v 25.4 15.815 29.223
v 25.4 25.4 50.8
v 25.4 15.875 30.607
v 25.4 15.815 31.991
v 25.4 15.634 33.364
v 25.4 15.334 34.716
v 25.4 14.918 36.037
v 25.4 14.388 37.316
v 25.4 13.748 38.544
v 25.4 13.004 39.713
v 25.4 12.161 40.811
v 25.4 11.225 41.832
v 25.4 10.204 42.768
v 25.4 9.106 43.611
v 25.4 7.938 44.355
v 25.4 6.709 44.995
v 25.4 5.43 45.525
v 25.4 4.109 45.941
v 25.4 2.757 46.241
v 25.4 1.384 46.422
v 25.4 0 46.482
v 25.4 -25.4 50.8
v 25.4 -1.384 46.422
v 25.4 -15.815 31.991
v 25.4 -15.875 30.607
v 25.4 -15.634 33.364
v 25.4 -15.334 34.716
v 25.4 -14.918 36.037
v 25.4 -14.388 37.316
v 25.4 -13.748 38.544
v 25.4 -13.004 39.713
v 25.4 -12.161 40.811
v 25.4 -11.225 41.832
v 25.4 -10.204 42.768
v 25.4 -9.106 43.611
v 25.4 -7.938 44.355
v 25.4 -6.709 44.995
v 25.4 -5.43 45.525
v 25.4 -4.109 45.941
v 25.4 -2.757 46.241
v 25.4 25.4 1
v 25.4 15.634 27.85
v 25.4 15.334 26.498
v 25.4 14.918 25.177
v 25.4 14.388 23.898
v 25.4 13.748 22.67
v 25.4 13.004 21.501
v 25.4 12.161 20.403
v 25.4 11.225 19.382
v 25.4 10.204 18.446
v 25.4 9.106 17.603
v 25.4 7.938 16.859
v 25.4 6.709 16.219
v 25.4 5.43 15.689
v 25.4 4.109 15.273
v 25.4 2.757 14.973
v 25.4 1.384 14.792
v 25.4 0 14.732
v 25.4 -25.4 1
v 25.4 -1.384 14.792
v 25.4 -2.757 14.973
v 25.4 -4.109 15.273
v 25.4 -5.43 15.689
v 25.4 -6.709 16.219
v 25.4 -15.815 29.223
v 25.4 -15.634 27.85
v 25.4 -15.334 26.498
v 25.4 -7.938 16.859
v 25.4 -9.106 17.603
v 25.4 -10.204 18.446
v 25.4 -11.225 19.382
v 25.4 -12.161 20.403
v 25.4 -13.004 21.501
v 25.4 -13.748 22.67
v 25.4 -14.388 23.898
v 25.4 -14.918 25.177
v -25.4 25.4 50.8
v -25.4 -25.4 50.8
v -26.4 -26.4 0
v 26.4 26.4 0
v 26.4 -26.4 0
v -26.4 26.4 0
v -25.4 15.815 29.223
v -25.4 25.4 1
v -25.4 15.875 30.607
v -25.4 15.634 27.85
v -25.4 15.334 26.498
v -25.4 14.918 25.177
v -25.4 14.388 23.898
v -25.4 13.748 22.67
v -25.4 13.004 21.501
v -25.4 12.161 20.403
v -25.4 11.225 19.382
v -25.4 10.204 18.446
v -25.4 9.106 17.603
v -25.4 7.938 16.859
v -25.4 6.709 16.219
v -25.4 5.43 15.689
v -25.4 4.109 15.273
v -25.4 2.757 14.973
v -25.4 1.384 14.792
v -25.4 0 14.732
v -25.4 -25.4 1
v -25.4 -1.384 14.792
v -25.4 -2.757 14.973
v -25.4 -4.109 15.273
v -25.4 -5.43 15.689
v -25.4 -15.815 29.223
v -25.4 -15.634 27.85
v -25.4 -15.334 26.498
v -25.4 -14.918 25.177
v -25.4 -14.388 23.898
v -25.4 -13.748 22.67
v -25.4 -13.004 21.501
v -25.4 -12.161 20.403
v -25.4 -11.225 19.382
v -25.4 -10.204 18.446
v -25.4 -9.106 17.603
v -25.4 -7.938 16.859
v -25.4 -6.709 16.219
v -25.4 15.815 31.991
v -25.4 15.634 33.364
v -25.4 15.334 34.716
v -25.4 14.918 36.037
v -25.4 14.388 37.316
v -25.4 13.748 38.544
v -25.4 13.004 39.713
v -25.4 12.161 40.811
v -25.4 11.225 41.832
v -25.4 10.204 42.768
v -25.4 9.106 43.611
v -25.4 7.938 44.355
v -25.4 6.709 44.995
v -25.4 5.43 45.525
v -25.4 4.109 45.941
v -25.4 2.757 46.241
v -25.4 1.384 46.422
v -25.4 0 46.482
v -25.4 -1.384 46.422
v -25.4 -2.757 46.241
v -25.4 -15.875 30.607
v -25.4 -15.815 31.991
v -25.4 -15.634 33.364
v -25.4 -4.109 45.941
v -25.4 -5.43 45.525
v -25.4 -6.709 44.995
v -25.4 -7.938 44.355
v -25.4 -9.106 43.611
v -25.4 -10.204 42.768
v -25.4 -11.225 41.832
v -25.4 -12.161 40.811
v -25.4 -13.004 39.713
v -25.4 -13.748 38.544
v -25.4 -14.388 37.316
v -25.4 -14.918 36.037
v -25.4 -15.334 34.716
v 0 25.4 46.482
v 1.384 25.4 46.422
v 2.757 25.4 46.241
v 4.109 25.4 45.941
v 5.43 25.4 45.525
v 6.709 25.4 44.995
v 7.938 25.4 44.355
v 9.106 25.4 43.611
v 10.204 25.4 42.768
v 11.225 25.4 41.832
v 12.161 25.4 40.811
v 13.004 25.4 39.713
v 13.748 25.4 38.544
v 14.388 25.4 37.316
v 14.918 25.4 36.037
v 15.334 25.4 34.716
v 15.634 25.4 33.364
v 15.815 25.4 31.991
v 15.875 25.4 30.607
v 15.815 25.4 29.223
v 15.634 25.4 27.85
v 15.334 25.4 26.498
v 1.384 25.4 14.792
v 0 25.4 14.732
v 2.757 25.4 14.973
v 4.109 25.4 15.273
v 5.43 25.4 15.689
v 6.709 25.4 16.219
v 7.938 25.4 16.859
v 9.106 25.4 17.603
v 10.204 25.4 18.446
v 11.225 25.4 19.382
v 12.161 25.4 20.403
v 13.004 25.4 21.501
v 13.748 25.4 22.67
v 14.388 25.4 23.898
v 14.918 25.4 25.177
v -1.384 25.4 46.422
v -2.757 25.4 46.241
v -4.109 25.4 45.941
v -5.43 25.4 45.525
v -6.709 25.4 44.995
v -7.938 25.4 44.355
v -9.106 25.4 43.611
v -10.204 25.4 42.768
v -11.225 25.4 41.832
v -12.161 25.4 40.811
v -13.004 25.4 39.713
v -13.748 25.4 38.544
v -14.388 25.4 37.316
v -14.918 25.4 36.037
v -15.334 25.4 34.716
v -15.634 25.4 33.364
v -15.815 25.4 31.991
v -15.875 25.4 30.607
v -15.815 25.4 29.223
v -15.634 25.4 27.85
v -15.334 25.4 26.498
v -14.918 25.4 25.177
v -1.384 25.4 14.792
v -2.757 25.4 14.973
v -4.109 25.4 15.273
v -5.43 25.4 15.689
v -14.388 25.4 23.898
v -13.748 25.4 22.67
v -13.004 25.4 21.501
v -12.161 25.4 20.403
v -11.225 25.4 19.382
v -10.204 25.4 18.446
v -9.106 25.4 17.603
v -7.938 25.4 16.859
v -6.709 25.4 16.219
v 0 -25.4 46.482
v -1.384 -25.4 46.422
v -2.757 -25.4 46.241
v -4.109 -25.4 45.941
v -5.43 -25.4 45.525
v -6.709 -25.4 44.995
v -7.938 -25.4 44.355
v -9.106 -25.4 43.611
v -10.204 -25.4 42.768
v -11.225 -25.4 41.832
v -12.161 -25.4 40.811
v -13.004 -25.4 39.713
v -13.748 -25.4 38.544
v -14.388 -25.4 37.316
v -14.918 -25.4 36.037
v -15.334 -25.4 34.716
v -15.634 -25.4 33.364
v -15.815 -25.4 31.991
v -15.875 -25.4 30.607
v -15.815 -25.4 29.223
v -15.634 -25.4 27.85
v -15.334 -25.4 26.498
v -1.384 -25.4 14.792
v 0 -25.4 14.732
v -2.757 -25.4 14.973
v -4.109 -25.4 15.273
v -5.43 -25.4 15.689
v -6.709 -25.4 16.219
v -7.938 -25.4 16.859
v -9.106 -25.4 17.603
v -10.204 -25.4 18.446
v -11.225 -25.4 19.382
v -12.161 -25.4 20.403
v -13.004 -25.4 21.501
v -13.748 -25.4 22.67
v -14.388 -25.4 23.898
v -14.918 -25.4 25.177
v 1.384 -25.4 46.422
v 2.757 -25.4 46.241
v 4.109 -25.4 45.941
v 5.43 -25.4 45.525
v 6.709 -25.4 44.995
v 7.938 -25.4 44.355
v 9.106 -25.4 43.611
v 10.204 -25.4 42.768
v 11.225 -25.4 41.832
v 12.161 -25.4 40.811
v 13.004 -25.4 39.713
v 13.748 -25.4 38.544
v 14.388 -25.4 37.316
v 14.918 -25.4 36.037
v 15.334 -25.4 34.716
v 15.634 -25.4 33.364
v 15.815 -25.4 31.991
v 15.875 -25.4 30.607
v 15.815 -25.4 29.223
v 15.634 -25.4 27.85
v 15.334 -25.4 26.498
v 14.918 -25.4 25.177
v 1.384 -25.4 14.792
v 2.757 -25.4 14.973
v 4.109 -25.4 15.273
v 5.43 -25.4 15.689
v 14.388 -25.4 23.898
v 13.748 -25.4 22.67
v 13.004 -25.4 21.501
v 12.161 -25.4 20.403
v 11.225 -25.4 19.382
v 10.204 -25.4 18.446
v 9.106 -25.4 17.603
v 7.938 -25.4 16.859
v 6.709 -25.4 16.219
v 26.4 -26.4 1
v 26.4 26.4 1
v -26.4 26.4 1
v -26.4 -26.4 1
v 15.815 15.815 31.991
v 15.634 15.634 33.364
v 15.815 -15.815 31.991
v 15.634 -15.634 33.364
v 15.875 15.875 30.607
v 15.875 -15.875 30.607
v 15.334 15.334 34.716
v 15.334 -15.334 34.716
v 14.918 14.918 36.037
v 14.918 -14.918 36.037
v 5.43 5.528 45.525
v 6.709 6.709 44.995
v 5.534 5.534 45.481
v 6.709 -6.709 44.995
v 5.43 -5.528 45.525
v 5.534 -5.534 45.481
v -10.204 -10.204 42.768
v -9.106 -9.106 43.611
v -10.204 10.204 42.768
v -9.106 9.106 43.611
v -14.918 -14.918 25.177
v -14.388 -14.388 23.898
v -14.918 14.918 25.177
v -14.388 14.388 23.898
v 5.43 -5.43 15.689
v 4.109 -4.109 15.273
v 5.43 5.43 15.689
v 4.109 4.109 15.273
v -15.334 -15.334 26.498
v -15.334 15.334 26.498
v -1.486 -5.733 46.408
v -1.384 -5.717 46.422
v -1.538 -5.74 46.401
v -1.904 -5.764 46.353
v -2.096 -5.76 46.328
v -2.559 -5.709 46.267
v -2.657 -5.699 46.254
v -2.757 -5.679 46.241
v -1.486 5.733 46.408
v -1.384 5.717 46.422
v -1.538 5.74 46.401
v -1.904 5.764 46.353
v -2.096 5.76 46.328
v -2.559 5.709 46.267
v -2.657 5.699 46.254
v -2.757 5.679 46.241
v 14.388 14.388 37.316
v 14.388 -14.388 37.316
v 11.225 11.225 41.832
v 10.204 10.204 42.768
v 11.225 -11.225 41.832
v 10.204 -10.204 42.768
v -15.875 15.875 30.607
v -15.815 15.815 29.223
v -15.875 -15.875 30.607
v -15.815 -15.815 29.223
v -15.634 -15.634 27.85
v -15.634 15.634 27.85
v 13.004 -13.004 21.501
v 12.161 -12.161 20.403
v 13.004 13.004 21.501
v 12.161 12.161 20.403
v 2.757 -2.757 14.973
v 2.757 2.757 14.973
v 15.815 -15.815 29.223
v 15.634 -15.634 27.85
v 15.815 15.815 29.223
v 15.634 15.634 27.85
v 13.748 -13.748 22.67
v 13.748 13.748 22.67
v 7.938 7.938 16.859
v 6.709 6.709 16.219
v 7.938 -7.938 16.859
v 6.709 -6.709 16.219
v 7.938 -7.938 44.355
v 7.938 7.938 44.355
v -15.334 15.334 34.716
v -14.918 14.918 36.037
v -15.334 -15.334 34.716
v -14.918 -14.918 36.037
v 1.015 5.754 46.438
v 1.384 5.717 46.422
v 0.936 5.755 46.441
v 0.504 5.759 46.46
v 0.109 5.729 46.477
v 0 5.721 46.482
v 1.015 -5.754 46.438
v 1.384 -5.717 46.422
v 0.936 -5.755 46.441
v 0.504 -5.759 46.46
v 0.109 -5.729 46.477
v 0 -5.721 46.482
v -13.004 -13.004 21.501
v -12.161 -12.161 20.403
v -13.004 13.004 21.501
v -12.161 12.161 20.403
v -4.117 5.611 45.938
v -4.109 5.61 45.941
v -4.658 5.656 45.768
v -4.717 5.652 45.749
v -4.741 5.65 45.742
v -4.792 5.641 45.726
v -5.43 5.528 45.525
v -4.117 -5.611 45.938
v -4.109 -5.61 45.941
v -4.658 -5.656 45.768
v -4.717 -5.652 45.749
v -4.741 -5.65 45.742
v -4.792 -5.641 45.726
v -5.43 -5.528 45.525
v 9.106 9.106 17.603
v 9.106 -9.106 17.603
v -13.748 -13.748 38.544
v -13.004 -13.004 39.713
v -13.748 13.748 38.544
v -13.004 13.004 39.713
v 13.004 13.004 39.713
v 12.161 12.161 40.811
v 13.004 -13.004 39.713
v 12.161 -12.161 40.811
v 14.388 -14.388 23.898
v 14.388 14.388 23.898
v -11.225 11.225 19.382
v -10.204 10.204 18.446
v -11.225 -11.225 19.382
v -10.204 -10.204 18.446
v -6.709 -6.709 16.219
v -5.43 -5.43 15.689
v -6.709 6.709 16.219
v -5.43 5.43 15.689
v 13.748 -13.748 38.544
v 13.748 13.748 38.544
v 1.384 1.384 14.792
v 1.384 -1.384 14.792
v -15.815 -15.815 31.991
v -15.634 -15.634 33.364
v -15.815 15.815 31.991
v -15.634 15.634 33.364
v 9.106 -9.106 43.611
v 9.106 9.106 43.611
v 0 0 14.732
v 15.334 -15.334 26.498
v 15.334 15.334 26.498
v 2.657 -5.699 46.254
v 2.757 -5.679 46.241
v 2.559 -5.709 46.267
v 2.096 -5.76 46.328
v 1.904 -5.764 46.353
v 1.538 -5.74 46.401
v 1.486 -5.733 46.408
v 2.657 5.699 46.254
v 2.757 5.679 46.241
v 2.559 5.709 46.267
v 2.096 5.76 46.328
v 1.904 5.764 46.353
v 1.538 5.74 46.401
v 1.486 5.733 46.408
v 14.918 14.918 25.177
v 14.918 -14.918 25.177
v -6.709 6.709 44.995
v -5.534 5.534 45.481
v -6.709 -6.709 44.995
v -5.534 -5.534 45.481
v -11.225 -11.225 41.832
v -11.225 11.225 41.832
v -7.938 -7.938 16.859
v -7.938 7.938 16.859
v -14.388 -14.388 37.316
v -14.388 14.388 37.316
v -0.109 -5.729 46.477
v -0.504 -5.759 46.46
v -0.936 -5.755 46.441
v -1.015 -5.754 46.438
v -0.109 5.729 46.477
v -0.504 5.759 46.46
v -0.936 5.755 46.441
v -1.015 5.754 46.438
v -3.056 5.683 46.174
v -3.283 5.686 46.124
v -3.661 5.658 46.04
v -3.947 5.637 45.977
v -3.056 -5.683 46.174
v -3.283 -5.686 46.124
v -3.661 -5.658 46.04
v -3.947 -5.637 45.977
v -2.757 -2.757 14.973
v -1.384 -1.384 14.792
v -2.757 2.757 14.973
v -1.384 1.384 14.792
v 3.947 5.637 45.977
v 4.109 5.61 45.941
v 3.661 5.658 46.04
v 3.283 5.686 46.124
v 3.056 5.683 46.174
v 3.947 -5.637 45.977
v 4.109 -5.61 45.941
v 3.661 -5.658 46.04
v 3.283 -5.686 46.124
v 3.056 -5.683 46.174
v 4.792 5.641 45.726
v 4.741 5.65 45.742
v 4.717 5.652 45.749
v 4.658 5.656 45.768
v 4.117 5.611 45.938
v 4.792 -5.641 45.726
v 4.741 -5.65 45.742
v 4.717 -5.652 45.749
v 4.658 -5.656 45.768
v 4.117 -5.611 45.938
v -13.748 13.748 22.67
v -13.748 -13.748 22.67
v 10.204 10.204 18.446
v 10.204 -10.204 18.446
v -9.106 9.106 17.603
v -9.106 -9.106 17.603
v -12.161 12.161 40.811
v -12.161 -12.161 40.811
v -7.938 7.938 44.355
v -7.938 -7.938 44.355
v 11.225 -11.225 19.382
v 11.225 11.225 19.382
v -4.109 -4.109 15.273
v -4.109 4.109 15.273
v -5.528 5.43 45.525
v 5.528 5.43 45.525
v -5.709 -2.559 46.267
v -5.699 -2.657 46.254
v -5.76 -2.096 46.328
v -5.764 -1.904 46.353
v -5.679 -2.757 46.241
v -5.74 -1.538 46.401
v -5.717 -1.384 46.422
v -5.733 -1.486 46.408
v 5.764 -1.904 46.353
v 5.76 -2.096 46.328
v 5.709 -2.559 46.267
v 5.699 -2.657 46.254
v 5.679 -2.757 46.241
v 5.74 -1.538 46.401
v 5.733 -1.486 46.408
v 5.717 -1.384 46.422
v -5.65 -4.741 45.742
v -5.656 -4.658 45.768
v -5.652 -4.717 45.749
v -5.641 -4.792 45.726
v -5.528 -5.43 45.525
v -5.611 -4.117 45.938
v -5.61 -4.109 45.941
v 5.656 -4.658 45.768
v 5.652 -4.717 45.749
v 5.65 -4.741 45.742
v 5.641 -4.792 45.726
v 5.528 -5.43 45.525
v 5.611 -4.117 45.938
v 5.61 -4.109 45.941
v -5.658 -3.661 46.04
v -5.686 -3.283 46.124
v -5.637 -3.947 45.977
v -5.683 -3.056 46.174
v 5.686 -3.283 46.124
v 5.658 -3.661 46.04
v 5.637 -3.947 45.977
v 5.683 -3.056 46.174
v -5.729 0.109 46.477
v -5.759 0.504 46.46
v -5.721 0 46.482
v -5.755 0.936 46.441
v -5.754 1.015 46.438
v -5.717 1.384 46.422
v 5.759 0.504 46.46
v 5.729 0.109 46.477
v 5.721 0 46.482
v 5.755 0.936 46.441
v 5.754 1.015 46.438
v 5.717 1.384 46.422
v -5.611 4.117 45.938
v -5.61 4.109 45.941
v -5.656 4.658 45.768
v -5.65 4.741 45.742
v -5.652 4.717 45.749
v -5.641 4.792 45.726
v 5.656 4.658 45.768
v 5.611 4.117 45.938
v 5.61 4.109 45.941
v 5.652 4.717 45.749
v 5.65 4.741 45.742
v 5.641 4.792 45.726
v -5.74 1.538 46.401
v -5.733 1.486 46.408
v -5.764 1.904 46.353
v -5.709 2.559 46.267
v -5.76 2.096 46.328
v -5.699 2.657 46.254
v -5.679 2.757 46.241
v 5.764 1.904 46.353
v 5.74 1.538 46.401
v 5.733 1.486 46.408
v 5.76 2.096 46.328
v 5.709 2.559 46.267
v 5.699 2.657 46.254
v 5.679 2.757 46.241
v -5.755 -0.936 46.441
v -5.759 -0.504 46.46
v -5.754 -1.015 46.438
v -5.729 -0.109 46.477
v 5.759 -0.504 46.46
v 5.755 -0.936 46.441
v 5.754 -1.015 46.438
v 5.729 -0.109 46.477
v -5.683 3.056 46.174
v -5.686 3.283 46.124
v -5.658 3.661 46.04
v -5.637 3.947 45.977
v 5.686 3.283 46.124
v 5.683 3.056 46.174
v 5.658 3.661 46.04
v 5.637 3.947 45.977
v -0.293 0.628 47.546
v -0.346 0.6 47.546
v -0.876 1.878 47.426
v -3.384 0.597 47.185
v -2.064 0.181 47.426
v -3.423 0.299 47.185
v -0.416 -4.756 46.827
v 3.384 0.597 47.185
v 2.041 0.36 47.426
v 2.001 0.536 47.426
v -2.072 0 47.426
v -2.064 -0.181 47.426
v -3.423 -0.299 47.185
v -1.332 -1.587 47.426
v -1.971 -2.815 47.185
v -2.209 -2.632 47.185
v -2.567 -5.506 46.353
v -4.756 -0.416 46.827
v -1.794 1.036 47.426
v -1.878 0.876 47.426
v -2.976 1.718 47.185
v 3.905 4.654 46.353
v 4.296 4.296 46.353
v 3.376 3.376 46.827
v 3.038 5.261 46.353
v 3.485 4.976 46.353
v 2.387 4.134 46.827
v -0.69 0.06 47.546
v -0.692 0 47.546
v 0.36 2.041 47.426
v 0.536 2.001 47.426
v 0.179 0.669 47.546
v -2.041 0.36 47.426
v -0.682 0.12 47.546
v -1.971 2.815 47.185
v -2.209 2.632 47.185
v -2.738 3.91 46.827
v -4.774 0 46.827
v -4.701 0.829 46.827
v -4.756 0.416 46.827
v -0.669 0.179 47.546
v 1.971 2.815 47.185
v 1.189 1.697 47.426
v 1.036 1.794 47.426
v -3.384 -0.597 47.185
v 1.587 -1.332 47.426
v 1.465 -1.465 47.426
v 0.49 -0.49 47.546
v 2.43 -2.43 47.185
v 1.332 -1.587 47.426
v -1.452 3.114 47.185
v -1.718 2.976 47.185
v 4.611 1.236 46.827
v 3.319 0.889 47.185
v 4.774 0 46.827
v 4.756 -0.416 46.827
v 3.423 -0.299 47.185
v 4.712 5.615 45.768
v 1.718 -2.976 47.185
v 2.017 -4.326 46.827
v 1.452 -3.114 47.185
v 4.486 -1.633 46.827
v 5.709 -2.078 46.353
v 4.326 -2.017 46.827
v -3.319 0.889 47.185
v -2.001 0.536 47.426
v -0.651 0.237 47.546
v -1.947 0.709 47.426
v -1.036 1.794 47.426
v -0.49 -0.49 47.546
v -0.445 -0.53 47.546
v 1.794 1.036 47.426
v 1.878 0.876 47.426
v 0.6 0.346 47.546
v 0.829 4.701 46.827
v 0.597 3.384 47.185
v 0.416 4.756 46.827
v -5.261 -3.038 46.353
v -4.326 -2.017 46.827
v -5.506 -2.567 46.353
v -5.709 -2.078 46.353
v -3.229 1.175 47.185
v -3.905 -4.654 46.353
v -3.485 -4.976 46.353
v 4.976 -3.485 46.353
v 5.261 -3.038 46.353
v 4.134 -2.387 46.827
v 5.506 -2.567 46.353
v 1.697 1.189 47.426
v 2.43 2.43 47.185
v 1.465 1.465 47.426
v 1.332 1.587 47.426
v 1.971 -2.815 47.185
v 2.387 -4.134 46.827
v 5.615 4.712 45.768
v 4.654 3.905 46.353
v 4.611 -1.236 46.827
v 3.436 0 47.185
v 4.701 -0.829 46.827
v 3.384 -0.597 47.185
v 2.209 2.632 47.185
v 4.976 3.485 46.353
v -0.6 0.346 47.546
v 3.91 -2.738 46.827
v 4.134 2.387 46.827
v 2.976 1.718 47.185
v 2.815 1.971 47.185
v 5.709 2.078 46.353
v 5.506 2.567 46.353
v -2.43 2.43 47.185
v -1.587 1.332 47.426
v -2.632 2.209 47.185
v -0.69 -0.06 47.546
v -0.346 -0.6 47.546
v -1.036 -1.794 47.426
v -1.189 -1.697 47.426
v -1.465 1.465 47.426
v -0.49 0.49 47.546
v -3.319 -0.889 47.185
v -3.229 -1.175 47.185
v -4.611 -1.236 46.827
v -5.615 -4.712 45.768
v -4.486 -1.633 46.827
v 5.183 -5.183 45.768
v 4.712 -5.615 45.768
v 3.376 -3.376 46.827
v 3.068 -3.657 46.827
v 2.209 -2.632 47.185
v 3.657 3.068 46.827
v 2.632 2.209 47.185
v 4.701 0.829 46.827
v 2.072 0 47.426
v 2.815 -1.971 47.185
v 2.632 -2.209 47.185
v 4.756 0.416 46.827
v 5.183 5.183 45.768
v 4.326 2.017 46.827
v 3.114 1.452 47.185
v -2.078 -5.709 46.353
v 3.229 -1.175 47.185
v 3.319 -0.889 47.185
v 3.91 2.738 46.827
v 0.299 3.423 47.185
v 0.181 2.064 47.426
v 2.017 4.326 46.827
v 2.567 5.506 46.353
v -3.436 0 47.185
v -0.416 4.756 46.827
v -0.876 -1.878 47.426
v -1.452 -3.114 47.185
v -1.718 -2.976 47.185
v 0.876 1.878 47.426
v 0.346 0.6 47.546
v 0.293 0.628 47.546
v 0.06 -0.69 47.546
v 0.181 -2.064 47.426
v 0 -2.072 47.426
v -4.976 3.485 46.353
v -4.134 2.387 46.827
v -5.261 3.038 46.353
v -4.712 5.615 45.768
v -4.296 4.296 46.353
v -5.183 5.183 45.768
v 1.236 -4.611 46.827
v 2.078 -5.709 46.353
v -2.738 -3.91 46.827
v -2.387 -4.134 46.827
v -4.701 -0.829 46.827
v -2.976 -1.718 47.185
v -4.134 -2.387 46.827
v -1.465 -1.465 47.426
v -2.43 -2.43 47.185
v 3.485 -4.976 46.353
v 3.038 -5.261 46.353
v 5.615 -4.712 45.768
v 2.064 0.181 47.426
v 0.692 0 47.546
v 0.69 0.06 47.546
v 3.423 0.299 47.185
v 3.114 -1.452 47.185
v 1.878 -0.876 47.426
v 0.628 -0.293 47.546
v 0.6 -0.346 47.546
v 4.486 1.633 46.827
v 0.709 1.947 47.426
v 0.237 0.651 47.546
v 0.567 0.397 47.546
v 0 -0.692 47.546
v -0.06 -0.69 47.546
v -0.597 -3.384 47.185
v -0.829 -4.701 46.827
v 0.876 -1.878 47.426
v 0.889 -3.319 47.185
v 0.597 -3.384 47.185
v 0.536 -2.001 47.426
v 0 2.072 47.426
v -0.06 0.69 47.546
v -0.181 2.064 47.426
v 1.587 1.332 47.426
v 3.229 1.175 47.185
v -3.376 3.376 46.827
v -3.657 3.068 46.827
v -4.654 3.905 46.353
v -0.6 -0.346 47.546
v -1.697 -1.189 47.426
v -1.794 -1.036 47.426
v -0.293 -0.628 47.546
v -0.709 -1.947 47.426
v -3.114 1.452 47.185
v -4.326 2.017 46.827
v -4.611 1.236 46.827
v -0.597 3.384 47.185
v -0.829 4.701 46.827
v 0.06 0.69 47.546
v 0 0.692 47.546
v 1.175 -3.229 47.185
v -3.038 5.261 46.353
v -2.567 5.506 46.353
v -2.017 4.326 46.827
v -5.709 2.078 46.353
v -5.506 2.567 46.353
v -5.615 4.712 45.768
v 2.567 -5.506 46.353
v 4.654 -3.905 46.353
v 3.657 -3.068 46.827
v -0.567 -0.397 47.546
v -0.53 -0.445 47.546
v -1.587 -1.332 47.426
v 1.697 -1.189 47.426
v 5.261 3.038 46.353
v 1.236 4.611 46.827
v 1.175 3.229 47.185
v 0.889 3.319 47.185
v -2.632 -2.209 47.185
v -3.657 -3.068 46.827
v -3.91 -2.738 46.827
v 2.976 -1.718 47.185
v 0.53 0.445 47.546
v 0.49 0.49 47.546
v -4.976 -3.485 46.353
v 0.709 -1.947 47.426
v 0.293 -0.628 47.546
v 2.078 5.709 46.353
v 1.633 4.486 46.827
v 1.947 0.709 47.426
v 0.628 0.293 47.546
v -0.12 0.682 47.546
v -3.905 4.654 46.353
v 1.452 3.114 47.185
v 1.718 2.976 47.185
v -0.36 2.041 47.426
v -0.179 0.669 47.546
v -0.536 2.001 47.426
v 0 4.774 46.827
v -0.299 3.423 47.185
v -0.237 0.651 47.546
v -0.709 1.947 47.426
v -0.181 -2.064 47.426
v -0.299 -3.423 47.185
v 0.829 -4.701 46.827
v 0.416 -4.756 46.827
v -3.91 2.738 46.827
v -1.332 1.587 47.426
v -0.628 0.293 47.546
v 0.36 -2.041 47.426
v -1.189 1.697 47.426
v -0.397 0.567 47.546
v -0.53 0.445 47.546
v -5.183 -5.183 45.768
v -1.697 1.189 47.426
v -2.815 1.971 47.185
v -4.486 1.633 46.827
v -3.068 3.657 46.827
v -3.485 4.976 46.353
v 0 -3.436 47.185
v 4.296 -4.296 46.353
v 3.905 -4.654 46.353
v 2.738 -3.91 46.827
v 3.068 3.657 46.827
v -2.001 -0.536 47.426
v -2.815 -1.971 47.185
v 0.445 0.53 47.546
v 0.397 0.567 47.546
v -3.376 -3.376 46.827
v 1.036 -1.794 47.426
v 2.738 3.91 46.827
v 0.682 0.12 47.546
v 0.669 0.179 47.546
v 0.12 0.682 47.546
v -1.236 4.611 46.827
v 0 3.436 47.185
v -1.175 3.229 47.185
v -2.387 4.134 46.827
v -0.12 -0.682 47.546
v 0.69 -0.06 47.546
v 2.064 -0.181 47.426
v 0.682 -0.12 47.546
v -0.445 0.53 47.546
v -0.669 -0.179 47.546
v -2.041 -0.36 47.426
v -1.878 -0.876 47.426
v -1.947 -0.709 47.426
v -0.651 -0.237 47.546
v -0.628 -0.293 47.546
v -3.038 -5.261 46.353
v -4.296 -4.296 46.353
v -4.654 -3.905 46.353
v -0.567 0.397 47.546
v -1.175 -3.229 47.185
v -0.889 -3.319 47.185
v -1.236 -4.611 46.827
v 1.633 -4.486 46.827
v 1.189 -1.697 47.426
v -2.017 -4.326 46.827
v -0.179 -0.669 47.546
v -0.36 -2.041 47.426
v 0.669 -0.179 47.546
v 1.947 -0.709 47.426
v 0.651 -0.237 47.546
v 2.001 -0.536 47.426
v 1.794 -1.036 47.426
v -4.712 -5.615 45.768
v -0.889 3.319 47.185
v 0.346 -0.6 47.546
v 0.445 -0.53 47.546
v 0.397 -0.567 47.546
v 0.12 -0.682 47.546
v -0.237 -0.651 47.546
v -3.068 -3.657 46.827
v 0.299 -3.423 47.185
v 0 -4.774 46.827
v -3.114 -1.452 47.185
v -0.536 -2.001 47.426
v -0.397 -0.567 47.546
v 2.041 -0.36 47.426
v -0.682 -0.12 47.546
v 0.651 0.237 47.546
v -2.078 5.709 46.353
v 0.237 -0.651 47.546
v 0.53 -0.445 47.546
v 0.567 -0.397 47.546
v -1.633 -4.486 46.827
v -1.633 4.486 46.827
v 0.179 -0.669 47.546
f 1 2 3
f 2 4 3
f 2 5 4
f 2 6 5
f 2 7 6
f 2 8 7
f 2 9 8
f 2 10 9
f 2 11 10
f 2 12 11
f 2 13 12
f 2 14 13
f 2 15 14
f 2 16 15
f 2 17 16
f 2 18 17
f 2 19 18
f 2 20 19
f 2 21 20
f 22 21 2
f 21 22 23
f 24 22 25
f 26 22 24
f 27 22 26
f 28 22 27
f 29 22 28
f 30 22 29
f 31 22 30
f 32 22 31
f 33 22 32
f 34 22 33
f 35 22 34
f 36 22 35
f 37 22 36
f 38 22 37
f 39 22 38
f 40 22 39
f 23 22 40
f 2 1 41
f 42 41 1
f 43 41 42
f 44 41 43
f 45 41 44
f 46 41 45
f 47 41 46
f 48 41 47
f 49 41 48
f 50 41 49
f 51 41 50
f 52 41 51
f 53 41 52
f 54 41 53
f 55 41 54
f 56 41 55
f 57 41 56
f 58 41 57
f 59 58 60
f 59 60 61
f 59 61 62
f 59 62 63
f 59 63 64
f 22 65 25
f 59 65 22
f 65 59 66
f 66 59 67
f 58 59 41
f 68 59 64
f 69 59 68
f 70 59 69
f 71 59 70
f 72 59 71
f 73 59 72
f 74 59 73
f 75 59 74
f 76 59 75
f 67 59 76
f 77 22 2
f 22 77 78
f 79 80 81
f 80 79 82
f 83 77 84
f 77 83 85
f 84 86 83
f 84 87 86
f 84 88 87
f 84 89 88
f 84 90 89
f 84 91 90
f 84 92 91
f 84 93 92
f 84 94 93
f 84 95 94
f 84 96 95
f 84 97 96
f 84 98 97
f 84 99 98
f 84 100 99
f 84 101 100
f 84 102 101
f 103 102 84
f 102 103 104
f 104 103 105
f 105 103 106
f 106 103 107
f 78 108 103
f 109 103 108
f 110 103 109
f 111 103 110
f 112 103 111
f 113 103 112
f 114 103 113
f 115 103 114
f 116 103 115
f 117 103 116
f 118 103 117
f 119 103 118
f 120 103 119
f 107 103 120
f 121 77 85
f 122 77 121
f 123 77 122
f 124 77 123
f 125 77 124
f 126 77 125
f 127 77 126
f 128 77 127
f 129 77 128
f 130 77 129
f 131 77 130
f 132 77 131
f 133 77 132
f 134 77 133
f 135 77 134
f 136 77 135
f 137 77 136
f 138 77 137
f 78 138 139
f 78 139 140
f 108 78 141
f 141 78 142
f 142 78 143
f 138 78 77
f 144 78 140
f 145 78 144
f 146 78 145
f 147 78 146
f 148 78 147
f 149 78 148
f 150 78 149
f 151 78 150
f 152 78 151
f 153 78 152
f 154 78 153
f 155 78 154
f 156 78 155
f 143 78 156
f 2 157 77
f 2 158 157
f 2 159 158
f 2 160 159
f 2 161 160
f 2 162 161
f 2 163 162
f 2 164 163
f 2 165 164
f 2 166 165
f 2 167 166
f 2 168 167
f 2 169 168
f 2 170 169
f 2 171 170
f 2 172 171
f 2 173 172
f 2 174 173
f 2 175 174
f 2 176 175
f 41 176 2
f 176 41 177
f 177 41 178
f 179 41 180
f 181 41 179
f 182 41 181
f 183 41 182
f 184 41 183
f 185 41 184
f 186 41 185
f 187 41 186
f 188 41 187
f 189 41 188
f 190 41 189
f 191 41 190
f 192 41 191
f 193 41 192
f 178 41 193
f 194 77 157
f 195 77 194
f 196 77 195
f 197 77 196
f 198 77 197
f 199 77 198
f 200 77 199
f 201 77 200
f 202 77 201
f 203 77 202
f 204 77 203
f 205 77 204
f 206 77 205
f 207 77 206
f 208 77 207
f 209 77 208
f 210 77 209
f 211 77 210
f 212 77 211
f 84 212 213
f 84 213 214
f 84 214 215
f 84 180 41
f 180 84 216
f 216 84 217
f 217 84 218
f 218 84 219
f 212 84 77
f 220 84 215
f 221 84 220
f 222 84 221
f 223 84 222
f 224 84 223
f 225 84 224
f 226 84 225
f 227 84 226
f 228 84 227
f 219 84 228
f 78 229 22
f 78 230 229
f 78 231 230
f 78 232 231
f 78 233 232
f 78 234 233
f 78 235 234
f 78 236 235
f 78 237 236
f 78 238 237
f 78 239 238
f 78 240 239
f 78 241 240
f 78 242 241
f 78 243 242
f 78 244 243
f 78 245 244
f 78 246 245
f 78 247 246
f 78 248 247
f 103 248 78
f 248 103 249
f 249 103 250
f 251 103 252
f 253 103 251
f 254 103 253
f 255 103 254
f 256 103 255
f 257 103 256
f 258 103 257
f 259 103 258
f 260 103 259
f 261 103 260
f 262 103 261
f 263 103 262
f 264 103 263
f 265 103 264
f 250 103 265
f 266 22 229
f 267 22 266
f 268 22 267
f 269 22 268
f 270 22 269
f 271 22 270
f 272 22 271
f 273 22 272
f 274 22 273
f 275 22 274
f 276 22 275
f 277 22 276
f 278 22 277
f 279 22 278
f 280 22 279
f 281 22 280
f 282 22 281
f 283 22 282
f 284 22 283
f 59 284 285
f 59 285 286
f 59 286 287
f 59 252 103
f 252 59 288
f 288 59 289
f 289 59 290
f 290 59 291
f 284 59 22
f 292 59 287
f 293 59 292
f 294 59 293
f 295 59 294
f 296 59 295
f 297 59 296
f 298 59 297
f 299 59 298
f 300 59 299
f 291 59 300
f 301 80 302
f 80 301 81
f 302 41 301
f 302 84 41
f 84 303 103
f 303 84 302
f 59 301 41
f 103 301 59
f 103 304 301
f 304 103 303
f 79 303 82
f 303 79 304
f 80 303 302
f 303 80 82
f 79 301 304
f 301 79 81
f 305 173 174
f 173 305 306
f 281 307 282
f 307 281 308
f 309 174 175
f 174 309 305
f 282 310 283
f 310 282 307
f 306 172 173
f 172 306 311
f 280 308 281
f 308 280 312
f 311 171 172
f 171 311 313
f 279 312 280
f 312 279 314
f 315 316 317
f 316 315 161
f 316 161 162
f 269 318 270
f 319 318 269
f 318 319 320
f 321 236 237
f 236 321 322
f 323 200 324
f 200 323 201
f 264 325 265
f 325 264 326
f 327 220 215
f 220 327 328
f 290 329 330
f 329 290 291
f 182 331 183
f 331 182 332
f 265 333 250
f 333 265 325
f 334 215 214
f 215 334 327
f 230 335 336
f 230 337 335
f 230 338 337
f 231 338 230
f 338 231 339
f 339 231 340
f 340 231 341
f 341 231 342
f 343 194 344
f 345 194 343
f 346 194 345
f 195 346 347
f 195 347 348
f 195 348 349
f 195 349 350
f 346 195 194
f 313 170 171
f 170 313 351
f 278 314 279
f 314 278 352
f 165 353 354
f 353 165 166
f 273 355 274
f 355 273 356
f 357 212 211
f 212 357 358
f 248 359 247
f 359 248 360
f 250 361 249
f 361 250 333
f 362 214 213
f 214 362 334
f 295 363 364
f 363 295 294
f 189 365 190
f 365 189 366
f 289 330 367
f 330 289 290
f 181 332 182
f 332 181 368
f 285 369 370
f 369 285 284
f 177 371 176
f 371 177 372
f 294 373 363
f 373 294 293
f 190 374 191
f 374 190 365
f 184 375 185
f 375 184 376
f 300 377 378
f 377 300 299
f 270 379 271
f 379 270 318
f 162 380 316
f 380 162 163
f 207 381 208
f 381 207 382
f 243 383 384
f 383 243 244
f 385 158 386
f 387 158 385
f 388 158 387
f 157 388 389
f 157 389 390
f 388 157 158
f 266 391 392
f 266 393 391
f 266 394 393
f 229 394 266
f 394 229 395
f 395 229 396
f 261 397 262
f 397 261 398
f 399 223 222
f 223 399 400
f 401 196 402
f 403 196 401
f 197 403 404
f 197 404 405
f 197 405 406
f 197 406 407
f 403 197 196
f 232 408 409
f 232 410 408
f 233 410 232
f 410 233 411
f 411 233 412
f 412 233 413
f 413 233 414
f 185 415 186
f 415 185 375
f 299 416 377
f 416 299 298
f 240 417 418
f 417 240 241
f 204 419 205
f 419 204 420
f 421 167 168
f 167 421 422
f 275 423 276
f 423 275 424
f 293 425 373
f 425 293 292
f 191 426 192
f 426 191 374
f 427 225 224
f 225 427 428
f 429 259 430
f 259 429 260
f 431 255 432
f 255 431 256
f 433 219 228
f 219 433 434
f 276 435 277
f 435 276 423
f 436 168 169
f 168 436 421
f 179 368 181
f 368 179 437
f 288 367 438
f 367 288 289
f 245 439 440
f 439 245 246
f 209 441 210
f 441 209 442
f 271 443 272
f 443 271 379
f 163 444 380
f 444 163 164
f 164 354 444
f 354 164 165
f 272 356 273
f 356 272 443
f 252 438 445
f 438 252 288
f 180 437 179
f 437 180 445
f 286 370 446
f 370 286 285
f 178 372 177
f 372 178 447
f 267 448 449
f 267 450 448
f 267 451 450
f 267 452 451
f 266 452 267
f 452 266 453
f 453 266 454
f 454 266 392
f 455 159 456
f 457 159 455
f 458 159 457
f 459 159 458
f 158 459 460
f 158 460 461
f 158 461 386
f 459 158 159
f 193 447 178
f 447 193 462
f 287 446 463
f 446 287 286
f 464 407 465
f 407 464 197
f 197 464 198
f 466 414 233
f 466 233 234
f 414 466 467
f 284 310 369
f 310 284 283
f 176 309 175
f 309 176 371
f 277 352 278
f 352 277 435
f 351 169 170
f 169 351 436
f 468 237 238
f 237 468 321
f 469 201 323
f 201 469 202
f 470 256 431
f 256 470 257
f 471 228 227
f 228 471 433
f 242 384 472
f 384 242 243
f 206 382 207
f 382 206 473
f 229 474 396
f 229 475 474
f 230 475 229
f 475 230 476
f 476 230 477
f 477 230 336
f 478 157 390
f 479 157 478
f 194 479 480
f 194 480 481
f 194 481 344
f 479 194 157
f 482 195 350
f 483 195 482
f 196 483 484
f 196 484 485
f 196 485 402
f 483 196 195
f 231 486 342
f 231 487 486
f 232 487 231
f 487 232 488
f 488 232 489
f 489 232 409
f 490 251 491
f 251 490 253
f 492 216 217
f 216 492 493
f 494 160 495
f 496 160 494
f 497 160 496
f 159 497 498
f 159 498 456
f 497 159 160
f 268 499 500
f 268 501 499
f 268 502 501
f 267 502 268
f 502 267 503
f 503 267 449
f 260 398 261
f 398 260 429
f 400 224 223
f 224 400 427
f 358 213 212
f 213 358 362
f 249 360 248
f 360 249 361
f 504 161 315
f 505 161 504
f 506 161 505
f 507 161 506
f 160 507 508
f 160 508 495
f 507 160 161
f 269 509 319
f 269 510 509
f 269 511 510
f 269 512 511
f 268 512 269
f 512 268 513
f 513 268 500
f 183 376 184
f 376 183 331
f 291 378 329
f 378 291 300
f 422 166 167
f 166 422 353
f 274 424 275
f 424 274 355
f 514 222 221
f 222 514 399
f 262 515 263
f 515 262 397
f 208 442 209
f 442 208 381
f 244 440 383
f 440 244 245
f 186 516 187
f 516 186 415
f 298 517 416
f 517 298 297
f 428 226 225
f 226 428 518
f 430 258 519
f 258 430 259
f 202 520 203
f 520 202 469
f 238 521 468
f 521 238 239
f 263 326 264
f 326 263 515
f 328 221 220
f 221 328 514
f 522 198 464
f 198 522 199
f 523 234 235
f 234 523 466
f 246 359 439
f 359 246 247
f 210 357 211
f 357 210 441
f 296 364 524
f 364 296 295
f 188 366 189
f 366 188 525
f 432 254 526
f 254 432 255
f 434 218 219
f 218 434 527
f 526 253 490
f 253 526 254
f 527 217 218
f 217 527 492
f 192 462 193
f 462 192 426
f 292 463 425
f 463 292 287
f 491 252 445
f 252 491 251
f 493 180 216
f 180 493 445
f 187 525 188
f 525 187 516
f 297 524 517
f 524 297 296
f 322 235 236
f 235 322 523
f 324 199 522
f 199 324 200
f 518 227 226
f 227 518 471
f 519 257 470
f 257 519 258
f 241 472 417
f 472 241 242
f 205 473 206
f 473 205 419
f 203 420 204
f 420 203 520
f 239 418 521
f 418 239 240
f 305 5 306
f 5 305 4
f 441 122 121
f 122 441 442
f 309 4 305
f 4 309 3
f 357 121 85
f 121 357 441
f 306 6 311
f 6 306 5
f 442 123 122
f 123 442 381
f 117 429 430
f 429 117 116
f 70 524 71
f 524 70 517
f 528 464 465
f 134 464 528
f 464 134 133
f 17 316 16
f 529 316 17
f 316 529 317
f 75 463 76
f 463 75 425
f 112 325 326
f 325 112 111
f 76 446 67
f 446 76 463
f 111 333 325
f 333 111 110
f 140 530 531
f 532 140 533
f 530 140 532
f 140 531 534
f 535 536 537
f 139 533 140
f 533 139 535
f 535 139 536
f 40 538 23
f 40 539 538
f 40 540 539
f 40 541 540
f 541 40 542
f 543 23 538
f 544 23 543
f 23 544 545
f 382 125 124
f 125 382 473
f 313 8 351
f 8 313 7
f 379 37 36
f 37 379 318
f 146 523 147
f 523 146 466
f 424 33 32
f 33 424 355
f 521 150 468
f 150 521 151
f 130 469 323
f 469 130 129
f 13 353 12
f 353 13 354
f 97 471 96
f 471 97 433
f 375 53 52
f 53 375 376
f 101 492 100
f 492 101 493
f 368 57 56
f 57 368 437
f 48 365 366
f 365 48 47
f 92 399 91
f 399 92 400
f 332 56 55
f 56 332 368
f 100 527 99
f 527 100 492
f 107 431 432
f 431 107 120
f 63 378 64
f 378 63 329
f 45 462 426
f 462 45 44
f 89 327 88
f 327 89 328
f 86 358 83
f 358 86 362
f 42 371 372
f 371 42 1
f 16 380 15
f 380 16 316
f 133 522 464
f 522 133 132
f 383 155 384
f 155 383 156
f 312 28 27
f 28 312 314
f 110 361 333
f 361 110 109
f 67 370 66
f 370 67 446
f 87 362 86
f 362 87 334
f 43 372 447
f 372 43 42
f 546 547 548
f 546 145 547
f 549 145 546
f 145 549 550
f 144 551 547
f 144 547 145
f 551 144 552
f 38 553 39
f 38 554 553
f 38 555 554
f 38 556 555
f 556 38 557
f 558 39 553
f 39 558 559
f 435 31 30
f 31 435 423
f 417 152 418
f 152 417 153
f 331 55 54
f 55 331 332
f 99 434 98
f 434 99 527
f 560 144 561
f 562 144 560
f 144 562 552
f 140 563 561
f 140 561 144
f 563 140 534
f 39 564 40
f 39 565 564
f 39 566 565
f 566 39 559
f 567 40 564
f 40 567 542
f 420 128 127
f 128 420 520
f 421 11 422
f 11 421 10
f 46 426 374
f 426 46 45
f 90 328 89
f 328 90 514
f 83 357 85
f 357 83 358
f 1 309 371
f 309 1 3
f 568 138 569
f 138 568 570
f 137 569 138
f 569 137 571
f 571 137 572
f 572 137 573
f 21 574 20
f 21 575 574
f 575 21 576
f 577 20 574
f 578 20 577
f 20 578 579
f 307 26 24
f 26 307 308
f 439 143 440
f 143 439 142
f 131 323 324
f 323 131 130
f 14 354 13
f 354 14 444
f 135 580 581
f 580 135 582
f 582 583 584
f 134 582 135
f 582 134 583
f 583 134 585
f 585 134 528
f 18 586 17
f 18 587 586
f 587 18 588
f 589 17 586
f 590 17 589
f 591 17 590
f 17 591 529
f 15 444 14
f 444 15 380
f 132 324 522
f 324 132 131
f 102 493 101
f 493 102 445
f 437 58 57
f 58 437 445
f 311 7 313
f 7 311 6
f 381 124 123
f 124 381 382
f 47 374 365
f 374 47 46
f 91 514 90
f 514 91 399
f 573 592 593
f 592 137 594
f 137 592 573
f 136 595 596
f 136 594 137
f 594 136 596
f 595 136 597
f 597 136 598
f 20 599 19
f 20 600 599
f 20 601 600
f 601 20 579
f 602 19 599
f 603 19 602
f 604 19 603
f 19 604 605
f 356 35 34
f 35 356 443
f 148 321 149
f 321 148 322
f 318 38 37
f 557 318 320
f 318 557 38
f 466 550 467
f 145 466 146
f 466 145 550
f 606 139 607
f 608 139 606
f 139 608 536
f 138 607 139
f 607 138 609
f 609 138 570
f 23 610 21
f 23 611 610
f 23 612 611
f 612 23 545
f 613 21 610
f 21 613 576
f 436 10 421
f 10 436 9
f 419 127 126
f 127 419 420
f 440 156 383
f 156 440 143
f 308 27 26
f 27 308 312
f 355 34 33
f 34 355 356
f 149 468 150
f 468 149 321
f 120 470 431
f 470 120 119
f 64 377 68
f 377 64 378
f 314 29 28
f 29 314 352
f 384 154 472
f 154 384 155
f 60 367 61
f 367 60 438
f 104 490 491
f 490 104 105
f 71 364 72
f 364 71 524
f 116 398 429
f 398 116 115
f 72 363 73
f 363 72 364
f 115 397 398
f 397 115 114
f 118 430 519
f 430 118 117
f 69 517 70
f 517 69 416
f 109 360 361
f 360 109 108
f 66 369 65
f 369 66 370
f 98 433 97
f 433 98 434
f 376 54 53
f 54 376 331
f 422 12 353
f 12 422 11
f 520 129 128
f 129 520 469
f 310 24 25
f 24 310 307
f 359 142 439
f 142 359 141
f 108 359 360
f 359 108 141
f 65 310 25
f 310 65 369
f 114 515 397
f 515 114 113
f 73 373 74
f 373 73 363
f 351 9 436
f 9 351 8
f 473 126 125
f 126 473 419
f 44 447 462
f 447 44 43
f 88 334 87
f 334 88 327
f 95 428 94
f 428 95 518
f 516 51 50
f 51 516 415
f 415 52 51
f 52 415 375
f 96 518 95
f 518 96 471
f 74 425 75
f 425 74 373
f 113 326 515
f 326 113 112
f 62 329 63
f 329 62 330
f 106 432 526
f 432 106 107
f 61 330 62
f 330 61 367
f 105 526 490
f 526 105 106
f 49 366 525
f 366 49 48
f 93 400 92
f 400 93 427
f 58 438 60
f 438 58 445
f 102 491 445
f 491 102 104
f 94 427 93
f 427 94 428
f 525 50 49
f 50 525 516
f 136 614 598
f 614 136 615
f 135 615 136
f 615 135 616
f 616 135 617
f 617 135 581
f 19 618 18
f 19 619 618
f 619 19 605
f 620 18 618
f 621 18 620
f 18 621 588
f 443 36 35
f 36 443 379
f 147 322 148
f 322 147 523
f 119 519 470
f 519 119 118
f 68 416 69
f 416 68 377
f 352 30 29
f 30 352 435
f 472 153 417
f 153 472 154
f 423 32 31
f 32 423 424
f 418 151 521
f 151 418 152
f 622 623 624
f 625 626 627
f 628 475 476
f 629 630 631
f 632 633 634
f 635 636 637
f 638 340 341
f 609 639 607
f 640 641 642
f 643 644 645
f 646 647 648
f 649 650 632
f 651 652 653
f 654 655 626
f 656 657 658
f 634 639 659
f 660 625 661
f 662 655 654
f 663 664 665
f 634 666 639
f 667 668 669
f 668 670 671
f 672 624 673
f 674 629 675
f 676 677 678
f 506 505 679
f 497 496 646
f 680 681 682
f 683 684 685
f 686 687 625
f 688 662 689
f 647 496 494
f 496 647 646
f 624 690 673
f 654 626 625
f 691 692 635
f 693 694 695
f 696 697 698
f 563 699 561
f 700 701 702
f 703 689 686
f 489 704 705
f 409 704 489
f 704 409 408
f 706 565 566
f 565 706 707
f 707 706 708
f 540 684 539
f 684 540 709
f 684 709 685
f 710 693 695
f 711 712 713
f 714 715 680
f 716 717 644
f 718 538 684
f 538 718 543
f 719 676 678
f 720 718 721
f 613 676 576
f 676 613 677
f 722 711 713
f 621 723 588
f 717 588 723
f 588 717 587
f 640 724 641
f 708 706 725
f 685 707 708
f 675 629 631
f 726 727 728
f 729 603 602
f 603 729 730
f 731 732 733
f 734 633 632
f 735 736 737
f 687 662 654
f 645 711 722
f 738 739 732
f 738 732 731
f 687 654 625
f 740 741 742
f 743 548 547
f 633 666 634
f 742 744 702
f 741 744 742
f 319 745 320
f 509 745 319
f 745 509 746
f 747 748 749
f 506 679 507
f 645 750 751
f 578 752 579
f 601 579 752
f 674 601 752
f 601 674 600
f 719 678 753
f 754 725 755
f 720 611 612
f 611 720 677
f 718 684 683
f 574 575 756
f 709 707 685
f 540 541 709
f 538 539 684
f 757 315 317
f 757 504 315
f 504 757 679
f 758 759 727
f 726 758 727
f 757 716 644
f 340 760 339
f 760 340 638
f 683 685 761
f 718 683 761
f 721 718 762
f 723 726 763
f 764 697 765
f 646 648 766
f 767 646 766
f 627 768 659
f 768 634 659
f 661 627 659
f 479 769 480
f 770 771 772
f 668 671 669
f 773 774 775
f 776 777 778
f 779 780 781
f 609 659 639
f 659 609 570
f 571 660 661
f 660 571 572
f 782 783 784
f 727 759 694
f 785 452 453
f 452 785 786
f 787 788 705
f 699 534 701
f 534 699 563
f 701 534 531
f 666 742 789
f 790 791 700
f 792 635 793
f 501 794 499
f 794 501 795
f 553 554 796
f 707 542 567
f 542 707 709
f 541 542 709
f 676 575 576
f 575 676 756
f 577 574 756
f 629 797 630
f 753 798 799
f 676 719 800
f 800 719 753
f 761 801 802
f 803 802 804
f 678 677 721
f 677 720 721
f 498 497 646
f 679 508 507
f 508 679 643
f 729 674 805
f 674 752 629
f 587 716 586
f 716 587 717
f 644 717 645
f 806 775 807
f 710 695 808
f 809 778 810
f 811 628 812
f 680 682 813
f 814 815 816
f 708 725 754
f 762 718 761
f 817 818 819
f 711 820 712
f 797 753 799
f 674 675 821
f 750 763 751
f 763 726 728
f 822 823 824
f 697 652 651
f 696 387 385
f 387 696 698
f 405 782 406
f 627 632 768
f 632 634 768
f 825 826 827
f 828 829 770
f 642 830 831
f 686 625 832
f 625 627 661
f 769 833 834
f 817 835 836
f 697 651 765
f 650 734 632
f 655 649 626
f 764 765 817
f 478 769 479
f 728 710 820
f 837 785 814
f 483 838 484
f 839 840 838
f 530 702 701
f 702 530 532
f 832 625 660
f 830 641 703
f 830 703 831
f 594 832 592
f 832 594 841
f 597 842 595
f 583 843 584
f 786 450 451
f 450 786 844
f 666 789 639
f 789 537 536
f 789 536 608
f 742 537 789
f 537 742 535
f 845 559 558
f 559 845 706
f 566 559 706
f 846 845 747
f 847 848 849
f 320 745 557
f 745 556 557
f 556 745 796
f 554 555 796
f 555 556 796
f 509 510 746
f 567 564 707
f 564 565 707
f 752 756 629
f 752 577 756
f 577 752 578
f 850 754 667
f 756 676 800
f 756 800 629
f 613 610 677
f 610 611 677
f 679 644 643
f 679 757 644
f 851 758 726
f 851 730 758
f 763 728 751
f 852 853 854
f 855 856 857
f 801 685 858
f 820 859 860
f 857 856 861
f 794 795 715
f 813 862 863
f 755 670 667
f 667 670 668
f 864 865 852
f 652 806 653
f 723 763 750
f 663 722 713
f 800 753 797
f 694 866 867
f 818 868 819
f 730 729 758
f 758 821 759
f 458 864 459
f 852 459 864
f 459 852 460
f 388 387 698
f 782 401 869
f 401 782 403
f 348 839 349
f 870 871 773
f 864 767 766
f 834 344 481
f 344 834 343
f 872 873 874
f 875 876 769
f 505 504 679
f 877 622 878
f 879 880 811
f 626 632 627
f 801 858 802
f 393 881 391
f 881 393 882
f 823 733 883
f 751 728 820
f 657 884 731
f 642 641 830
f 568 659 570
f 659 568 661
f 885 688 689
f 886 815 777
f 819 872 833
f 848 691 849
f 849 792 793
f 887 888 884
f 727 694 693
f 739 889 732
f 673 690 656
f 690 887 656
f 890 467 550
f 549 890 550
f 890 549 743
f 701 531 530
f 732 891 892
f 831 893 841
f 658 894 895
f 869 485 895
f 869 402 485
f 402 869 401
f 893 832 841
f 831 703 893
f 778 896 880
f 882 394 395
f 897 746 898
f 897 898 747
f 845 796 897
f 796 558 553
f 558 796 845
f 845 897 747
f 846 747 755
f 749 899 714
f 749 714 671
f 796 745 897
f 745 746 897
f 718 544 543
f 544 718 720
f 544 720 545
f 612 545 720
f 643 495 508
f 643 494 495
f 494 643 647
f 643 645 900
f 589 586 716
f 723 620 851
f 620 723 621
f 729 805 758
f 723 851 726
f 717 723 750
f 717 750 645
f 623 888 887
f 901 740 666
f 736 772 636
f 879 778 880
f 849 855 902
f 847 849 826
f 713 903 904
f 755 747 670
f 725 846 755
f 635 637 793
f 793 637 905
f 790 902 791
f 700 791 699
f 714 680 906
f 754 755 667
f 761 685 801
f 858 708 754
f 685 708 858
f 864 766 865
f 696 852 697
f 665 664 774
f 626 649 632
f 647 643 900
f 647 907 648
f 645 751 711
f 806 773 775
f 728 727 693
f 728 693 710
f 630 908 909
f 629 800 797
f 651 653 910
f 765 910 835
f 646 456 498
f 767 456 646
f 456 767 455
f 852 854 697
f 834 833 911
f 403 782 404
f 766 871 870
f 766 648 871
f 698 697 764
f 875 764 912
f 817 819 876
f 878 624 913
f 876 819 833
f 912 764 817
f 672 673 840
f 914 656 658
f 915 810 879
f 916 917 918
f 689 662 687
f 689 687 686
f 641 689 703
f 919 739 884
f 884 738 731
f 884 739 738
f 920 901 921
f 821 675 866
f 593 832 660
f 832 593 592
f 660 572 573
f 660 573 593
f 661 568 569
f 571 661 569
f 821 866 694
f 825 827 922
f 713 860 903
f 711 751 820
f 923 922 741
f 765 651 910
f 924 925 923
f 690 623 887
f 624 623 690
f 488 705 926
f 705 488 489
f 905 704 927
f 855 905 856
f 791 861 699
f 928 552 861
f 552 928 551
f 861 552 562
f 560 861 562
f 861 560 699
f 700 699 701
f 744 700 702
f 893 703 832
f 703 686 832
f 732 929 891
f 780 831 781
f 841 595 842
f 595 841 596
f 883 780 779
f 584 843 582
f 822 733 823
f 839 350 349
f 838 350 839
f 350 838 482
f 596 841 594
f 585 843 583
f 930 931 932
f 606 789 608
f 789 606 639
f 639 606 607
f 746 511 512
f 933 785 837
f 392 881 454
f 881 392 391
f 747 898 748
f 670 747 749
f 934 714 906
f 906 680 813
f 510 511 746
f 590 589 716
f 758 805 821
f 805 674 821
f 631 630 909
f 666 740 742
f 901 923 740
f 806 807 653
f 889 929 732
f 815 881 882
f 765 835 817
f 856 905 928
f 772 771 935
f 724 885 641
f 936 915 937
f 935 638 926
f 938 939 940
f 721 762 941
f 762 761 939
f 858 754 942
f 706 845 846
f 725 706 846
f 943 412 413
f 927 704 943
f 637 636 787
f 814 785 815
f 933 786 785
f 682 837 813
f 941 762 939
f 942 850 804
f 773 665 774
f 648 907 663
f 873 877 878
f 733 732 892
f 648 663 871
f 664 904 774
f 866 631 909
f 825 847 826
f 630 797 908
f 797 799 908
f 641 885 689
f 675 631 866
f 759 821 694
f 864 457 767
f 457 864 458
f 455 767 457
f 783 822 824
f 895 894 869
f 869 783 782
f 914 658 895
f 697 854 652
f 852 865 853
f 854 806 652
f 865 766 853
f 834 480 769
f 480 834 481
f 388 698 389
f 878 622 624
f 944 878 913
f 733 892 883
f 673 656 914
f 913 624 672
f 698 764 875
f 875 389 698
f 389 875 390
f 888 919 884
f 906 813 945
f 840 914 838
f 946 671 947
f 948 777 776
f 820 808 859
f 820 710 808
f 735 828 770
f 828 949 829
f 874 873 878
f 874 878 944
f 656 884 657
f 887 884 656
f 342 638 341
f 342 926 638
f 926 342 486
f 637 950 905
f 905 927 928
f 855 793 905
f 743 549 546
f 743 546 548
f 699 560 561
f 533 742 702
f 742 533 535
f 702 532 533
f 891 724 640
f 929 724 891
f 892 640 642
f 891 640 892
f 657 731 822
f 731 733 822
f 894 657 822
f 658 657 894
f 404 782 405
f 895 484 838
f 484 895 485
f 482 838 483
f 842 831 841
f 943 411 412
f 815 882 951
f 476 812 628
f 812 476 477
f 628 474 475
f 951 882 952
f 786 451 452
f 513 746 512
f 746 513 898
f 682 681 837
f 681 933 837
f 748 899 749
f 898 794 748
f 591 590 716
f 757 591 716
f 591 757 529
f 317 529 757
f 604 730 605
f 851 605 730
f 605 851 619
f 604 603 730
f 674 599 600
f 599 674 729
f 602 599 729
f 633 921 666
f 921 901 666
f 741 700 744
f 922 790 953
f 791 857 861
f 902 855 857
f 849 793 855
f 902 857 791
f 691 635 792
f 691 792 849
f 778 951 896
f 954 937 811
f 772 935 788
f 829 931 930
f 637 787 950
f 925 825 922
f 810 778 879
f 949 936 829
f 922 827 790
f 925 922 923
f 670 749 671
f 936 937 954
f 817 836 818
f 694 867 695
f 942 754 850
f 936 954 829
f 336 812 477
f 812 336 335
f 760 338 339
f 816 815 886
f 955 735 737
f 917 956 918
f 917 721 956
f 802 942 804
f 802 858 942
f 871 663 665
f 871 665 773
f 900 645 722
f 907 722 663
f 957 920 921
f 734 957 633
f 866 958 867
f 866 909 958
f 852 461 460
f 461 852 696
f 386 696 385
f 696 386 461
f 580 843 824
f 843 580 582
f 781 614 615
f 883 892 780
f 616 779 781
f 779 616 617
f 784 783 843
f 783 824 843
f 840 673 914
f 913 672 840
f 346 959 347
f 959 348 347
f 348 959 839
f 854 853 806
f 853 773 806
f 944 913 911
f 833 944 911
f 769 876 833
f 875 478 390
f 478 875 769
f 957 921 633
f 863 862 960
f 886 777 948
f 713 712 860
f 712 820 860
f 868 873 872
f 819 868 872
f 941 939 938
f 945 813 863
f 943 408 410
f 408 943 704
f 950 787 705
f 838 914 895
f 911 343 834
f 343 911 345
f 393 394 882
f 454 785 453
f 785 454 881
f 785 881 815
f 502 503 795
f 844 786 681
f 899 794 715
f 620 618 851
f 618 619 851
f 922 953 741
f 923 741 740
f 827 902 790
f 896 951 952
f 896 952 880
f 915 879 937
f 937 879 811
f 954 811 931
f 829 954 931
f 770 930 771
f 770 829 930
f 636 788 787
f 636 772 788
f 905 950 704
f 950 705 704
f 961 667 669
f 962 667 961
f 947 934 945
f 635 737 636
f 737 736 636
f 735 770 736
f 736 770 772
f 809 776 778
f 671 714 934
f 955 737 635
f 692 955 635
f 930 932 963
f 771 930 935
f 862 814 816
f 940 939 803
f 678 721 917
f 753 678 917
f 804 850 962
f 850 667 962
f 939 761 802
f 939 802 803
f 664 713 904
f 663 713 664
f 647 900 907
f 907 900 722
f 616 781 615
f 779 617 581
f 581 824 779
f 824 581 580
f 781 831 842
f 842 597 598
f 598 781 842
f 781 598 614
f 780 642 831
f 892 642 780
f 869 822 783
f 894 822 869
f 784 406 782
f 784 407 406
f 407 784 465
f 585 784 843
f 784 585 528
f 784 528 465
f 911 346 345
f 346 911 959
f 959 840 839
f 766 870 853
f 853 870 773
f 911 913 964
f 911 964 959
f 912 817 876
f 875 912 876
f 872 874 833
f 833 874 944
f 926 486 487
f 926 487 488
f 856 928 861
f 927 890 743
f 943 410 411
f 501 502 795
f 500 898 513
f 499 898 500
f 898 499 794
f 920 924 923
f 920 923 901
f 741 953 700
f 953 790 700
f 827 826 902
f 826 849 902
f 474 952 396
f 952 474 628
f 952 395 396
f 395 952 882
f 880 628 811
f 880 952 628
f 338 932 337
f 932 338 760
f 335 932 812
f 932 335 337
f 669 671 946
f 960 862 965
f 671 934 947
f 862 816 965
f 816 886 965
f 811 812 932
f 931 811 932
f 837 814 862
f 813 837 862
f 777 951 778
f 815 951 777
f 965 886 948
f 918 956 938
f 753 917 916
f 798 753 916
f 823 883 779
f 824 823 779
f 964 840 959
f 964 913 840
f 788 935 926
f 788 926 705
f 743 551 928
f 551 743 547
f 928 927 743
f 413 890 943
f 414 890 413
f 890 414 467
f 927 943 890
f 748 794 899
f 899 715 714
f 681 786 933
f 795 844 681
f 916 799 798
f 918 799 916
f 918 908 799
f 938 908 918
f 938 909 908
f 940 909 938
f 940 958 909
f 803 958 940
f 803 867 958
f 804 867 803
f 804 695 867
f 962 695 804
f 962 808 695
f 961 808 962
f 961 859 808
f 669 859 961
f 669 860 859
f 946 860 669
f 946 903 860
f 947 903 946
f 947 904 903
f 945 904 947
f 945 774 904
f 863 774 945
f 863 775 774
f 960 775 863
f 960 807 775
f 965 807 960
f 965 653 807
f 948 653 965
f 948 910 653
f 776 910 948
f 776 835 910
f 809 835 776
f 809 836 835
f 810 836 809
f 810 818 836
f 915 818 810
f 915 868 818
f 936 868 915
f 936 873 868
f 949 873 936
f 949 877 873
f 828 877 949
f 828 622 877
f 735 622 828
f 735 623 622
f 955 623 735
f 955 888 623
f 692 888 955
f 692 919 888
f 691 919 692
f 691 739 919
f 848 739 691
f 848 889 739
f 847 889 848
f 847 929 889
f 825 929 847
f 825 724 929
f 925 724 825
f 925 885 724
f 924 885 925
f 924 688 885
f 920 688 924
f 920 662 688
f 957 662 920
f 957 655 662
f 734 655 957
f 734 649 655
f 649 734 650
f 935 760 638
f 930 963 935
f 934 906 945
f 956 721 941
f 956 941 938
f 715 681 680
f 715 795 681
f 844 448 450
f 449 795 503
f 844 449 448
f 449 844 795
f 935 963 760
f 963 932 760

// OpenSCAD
// Treating 1 unit as 1mm
units = 25.4;
width=2*units;
height=2*units;
arch_thickness=0.17*units;
hole_size = 1.25*units;  //width - 4*arch_thickness;
lip_height = 1;
lip_width = 1;

// arc angle and segment length (when generating circles and arcs, it will break the arc into segments like this)
$fa=5;
$fs=1;

difference() {
  difference() {
    union() {
       translate([0,0,height/2]) cube([width, width, height],center=true);
       translate([0,0,lip_height/2]) cube([width+2*lip_width, width+2*lip_width, lip_height], center=true);
    }

    translate([0,0,height - hole_size/2 - arch_thickness]) union() {
      rotate([90,0,0]) cylinder(d=hole_size, h=2*width, center=true);
      rotate([90,0,90]) cylinder(d=hole_size, h=2*width, center=true);
    }
  }

  // The sphere to dome the inside ceiling
  translate([0,0,height - hole_size/2 - 0.75*arch_thickness]) sphere(d=hole_size);
}
